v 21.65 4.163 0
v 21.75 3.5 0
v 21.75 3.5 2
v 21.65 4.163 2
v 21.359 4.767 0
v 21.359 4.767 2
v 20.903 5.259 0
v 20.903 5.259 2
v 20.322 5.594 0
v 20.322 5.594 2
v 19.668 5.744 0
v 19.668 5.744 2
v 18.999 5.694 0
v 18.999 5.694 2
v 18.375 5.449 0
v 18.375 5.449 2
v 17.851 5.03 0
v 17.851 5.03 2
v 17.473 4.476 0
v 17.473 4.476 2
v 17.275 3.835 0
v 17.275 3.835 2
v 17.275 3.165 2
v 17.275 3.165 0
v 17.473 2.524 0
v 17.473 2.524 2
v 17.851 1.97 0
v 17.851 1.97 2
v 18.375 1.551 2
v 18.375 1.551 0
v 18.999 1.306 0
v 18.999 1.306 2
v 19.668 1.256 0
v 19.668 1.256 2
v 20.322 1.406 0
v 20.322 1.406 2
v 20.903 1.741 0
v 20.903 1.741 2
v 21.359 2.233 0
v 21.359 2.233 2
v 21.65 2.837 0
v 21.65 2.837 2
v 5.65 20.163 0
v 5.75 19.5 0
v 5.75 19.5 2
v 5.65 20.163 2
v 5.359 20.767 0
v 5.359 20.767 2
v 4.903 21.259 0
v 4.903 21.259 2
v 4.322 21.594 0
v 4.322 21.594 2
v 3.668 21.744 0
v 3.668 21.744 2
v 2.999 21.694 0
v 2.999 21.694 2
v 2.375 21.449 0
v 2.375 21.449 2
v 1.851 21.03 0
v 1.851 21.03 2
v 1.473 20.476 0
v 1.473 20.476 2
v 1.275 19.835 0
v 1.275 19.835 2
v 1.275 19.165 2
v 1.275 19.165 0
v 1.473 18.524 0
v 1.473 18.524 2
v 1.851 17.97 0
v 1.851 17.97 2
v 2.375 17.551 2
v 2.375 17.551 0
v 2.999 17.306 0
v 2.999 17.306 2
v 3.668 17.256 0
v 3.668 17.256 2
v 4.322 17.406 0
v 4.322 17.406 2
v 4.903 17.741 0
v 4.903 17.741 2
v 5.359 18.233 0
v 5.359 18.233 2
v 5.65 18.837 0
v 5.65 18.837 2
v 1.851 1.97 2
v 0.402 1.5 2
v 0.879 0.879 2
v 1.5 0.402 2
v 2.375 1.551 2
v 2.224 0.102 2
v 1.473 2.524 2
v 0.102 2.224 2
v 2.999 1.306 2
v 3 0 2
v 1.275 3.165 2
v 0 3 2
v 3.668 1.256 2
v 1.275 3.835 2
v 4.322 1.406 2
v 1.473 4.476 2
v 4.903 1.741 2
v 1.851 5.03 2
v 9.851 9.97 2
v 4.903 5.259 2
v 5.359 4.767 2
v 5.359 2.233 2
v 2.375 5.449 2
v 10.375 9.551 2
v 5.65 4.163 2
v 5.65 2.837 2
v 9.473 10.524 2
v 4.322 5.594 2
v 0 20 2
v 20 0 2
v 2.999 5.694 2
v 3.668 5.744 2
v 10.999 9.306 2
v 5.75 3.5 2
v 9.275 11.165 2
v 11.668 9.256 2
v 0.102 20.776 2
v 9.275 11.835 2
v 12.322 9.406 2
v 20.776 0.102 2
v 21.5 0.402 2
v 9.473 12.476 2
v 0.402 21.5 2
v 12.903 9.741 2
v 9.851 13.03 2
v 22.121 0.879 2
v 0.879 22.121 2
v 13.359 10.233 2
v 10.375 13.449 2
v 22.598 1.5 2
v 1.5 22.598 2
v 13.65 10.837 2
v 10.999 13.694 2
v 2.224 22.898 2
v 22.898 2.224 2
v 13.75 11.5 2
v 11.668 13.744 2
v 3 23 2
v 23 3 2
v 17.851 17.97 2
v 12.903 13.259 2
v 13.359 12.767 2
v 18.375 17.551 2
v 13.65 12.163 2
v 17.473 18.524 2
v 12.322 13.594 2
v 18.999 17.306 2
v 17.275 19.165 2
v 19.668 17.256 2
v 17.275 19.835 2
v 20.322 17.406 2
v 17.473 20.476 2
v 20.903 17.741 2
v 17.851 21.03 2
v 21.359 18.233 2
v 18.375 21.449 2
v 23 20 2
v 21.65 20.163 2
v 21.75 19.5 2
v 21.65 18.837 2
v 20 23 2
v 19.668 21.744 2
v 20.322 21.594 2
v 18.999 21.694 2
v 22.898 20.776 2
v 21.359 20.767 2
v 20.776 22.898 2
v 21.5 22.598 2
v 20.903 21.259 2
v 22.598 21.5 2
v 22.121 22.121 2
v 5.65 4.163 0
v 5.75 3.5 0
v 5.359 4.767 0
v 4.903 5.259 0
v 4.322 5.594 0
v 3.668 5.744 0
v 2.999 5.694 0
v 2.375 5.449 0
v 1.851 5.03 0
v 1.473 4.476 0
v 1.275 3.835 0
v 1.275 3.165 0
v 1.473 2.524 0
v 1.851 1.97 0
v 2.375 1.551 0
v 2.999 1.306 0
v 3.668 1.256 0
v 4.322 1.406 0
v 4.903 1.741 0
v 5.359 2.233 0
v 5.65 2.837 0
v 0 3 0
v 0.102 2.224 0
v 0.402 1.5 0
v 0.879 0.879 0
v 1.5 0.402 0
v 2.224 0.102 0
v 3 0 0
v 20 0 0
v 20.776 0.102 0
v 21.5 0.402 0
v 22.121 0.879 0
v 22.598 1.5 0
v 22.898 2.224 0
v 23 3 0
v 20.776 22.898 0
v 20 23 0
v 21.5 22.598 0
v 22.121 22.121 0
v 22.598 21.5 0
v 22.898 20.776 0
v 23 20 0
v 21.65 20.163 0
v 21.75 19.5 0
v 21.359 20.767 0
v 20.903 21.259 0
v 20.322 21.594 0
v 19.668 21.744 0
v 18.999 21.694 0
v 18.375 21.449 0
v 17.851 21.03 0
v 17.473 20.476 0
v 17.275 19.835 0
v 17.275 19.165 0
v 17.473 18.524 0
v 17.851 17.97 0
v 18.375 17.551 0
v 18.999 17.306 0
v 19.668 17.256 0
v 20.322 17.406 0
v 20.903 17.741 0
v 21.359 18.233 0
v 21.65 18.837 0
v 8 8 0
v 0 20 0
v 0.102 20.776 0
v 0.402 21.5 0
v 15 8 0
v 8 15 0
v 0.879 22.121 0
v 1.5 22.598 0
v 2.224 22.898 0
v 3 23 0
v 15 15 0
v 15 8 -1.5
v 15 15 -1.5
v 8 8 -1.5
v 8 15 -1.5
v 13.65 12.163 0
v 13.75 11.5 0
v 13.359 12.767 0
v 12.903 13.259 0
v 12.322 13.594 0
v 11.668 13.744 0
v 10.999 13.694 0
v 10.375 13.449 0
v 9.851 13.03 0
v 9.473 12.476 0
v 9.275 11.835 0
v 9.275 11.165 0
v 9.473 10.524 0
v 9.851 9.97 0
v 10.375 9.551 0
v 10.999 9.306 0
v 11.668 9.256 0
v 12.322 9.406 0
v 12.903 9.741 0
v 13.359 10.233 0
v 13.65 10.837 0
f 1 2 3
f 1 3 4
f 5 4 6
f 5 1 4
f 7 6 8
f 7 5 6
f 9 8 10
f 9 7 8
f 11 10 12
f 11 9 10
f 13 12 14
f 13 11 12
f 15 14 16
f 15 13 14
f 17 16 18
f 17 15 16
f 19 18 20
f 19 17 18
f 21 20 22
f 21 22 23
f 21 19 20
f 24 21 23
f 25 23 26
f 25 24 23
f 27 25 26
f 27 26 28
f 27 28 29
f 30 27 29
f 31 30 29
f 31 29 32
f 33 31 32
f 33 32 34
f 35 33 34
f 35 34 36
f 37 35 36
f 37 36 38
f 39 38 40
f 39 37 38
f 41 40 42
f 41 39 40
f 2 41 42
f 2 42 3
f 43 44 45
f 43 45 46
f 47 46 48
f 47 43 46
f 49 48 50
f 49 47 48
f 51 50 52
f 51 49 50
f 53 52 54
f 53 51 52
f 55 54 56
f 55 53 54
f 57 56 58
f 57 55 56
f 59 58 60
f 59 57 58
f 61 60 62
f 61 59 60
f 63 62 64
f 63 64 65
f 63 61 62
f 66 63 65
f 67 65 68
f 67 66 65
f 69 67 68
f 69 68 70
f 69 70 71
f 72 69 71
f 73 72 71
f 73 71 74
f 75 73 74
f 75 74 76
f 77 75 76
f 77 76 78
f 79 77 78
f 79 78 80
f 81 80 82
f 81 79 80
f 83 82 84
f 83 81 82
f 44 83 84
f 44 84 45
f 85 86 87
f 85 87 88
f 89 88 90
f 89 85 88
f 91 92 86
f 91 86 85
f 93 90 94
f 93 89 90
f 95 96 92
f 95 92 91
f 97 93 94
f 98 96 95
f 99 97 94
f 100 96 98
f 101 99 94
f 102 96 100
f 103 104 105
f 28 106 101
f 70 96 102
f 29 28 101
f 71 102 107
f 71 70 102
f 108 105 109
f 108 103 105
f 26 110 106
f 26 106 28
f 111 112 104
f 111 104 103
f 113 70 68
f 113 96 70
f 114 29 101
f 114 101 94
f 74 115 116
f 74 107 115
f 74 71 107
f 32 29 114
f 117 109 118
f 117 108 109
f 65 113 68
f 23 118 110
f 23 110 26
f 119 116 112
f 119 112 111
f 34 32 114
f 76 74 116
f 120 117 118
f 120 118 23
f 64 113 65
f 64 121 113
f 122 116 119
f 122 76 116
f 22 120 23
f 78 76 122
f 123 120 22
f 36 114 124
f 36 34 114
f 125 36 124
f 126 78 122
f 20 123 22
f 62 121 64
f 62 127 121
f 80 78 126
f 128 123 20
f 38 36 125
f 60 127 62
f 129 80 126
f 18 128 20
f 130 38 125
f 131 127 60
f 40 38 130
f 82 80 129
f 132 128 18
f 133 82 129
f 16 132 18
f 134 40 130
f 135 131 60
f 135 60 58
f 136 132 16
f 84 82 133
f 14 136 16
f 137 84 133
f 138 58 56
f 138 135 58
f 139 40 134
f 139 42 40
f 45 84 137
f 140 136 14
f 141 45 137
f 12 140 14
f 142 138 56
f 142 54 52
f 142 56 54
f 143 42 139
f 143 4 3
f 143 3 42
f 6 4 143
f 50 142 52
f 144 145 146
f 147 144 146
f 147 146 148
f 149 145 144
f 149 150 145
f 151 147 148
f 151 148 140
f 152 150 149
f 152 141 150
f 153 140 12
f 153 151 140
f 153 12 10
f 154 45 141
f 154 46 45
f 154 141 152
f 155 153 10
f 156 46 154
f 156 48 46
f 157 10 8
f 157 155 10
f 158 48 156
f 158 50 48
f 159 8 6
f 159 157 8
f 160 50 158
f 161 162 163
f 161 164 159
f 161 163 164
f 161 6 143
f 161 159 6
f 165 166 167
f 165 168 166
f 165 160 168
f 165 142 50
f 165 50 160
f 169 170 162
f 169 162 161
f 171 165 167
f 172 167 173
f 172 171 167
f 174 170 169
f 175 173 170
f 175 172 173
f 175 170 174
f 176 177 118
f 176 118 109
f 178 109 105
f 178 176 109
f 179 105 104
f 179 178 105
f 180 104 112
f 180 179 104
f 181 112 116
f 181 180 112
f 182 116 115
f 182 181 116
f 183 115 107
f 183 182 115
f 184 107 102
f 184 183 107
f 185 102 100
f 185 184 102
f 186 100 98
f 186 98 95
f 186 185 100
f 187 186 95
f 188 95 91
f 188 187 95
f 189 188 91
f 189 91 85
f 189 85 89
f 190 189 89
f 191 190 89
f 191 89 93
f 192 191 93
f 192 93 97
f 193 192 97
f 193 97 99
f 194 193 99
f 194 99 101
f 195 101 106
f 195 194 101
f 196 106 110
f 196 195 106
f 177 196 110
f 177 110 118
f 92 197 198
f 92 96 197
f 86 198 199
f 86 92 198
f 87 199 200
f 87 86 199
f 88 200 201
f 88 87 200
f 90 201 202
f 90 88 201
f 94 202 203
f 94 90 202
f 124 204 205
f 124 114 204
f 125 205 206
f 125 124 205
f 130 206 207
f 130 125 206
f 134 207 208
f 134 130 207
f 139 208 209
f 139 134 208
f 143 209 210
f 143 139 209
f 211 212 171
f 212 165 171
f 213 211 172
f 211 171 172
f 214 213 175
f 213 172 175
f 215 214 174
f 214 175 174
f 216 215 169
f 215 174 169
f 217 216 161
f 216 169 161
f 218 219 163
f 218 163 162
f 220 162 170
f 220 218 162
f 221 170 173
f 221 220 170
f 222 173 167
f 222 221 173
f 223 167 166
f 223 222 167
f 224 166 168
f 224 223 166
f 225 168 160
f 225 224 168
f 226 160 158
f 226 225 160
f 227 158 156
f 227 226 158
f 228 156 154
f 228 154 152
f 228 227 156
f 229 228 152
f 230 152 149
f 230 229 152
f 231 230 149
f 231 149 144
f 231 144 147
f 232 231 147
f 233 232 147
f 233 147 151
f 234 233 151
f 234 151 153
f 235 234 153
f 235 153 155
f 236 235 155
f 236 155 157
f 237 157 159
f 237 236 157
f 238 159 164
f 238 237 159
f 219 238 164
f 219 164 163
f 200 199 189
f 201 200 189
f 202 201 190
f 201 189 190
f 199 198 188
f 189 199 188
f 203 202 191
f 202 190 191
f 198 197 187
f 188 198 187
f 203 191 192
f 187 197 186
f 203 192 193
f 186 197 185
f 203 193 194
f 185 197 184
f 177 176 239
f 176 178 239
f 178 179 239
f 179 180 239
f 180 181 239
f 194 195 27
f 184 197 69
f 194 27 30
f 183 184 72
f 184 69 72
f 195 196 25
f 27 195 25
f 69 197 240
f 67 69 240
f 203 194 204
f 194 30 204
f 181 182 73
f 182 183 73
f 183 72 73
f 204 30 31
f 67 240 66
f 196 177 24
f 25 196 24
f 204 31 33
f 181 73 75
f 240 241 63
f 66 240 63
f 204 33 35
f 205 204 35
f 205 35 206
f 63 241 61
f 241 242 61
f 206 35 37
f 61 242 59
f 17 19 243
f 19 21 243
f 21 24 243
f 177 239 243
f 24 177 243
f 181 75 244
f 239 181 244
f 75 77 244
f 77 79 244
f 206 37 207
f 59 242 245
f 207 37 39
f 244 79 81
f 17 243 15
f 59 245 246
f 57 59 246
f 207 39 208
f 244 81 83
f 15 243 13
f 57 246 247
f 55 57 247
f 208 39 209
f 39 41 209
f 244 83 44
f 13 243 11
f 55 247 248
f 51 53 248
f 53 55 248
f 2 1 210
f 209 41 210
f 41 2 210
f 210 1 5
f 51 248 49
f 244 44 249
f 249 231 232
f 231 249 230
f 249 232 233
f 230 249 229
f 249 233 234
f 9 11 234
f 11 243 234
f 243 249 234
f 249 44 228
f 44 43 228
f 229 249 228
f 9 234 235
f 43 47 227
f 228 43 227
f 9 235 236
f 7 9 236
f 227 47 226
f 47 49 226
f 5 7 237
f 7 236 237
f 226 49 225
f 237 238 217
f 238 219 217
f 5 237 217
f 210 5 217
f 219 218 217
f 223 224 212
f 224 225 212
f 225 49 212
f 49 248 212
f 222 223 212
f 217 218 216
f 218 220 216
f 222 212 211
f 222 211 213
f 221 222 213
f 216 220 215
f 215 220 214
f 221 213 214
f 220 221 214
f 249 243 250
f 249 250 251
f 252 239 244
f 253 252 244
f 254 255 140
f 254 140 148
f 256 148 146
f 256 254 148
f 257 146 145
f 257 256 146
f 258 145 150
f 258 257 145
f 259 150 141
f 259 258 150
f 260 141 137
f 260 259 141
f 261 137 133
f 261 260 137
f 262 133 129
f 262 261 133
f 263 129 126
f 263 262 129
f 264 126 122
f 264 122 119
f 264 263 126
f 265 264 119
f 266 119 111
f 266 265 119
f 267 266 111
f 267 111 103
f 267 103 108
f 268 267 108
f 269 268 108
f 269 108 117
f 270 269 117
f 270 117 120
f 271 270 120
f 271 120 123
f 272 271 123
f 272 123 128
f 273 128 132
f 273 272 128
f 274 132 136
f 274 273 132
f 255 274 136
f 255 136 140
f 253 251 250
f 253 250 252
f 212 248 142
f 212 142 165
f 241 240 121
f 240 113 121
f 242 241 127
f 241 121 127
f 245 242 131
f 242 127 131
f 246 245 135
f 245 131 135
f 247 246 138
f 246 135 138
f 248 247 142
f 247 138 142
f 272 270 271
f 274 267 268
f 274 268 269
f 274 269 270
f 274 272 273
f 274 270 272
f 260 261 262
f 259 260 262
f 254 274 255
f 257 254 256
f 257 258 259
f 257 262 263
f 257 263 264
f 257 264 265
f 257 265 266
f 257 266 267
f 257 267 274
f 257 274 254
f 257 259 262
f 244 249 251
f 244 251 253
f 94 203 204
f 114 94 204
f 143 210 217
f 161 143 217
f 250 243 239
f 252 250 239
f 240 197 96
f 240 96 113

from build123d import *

# Parameters (mm, degrees)
SKETCH_1_W                 = 23
SKETCH_1_H                 = 23
EXTRUDE_1_DEPTH            = 2
SKETCH_2_W                 = 7
SKETCH_2_H                 = 7
EXTRUDE_2_DEPTH            = 1.5
FILLET_1_R                 = 3
HOLE_WIZARD_M4_1_OUTLINE_R = 2.25
HOLE_WIZARD_M4_1_DEPTH     = 2


# Read off the part's stored shape, not the designer's step: M4 间隙孔1
with BuildPart() as part:
    # 草图1 → 凸台-拉伸1 (new body)
    with BuildSketch(Plane.XY):
        with Locations((11.5, 11.5)):
            Rectangle(SKETCH_1_W, SKETCH_1_H)
    extrude(amount=EXTRUDE_1_DEPTH)

    # 草图2 → 凸台-拉伸2 (add)
    with BuildSketch(Plane(origin=(0, 0, 0), x_dir=(-1, 0, 0), z_dir=(0, 0, -1))):
        with Locations((-11.5, 11.5)):
            Rectangle(SKETCH_2_W, SKETCH_2_H)
    extrude(amount=EXTRUDE_2_DEPTH)

    # 圆角1
    fillet_1_edges = [part.edges().sort_by_distance(p)[0] for p in [
        (0, 23, 1),
        (23, 23, 1),
        (23, 0, 1),
        (0, 0, 1),
    ]]
    fillet(fillet_1_edges, radius=FILLET_1_R)

    # M4 间隙孔1 outline → M4 间隙孔1 (cut)
    with BuildSketch(Plane.XY):
        with Locations((3.5, 3.5)):
            Circle(HOLE_WIZARD_M4_1_OUTLINE_R)
        with Locations((19.5, 19.5)):
            Circle(HOLE_WIZARD_M4_1_OUTLINE_R)
        with Locations((19.5, 3.5)):
            Circle(HOLE_WIZARD_M4_1_OUTLINE_R)
        with Locations((3.5, 19.5)):
            Circle(HOLE_WIZARD_M4_1_OUTLINE_R)
        with Locations((11.5, 11.5)):
            Circle(HOLE_WIZARD_M4_1_OUTLINE_R)
    extrude(amount=HOLE_WIZARD_M4_1_DEPTH, mode=Mode.SUBTRACT)


solid = part.part
